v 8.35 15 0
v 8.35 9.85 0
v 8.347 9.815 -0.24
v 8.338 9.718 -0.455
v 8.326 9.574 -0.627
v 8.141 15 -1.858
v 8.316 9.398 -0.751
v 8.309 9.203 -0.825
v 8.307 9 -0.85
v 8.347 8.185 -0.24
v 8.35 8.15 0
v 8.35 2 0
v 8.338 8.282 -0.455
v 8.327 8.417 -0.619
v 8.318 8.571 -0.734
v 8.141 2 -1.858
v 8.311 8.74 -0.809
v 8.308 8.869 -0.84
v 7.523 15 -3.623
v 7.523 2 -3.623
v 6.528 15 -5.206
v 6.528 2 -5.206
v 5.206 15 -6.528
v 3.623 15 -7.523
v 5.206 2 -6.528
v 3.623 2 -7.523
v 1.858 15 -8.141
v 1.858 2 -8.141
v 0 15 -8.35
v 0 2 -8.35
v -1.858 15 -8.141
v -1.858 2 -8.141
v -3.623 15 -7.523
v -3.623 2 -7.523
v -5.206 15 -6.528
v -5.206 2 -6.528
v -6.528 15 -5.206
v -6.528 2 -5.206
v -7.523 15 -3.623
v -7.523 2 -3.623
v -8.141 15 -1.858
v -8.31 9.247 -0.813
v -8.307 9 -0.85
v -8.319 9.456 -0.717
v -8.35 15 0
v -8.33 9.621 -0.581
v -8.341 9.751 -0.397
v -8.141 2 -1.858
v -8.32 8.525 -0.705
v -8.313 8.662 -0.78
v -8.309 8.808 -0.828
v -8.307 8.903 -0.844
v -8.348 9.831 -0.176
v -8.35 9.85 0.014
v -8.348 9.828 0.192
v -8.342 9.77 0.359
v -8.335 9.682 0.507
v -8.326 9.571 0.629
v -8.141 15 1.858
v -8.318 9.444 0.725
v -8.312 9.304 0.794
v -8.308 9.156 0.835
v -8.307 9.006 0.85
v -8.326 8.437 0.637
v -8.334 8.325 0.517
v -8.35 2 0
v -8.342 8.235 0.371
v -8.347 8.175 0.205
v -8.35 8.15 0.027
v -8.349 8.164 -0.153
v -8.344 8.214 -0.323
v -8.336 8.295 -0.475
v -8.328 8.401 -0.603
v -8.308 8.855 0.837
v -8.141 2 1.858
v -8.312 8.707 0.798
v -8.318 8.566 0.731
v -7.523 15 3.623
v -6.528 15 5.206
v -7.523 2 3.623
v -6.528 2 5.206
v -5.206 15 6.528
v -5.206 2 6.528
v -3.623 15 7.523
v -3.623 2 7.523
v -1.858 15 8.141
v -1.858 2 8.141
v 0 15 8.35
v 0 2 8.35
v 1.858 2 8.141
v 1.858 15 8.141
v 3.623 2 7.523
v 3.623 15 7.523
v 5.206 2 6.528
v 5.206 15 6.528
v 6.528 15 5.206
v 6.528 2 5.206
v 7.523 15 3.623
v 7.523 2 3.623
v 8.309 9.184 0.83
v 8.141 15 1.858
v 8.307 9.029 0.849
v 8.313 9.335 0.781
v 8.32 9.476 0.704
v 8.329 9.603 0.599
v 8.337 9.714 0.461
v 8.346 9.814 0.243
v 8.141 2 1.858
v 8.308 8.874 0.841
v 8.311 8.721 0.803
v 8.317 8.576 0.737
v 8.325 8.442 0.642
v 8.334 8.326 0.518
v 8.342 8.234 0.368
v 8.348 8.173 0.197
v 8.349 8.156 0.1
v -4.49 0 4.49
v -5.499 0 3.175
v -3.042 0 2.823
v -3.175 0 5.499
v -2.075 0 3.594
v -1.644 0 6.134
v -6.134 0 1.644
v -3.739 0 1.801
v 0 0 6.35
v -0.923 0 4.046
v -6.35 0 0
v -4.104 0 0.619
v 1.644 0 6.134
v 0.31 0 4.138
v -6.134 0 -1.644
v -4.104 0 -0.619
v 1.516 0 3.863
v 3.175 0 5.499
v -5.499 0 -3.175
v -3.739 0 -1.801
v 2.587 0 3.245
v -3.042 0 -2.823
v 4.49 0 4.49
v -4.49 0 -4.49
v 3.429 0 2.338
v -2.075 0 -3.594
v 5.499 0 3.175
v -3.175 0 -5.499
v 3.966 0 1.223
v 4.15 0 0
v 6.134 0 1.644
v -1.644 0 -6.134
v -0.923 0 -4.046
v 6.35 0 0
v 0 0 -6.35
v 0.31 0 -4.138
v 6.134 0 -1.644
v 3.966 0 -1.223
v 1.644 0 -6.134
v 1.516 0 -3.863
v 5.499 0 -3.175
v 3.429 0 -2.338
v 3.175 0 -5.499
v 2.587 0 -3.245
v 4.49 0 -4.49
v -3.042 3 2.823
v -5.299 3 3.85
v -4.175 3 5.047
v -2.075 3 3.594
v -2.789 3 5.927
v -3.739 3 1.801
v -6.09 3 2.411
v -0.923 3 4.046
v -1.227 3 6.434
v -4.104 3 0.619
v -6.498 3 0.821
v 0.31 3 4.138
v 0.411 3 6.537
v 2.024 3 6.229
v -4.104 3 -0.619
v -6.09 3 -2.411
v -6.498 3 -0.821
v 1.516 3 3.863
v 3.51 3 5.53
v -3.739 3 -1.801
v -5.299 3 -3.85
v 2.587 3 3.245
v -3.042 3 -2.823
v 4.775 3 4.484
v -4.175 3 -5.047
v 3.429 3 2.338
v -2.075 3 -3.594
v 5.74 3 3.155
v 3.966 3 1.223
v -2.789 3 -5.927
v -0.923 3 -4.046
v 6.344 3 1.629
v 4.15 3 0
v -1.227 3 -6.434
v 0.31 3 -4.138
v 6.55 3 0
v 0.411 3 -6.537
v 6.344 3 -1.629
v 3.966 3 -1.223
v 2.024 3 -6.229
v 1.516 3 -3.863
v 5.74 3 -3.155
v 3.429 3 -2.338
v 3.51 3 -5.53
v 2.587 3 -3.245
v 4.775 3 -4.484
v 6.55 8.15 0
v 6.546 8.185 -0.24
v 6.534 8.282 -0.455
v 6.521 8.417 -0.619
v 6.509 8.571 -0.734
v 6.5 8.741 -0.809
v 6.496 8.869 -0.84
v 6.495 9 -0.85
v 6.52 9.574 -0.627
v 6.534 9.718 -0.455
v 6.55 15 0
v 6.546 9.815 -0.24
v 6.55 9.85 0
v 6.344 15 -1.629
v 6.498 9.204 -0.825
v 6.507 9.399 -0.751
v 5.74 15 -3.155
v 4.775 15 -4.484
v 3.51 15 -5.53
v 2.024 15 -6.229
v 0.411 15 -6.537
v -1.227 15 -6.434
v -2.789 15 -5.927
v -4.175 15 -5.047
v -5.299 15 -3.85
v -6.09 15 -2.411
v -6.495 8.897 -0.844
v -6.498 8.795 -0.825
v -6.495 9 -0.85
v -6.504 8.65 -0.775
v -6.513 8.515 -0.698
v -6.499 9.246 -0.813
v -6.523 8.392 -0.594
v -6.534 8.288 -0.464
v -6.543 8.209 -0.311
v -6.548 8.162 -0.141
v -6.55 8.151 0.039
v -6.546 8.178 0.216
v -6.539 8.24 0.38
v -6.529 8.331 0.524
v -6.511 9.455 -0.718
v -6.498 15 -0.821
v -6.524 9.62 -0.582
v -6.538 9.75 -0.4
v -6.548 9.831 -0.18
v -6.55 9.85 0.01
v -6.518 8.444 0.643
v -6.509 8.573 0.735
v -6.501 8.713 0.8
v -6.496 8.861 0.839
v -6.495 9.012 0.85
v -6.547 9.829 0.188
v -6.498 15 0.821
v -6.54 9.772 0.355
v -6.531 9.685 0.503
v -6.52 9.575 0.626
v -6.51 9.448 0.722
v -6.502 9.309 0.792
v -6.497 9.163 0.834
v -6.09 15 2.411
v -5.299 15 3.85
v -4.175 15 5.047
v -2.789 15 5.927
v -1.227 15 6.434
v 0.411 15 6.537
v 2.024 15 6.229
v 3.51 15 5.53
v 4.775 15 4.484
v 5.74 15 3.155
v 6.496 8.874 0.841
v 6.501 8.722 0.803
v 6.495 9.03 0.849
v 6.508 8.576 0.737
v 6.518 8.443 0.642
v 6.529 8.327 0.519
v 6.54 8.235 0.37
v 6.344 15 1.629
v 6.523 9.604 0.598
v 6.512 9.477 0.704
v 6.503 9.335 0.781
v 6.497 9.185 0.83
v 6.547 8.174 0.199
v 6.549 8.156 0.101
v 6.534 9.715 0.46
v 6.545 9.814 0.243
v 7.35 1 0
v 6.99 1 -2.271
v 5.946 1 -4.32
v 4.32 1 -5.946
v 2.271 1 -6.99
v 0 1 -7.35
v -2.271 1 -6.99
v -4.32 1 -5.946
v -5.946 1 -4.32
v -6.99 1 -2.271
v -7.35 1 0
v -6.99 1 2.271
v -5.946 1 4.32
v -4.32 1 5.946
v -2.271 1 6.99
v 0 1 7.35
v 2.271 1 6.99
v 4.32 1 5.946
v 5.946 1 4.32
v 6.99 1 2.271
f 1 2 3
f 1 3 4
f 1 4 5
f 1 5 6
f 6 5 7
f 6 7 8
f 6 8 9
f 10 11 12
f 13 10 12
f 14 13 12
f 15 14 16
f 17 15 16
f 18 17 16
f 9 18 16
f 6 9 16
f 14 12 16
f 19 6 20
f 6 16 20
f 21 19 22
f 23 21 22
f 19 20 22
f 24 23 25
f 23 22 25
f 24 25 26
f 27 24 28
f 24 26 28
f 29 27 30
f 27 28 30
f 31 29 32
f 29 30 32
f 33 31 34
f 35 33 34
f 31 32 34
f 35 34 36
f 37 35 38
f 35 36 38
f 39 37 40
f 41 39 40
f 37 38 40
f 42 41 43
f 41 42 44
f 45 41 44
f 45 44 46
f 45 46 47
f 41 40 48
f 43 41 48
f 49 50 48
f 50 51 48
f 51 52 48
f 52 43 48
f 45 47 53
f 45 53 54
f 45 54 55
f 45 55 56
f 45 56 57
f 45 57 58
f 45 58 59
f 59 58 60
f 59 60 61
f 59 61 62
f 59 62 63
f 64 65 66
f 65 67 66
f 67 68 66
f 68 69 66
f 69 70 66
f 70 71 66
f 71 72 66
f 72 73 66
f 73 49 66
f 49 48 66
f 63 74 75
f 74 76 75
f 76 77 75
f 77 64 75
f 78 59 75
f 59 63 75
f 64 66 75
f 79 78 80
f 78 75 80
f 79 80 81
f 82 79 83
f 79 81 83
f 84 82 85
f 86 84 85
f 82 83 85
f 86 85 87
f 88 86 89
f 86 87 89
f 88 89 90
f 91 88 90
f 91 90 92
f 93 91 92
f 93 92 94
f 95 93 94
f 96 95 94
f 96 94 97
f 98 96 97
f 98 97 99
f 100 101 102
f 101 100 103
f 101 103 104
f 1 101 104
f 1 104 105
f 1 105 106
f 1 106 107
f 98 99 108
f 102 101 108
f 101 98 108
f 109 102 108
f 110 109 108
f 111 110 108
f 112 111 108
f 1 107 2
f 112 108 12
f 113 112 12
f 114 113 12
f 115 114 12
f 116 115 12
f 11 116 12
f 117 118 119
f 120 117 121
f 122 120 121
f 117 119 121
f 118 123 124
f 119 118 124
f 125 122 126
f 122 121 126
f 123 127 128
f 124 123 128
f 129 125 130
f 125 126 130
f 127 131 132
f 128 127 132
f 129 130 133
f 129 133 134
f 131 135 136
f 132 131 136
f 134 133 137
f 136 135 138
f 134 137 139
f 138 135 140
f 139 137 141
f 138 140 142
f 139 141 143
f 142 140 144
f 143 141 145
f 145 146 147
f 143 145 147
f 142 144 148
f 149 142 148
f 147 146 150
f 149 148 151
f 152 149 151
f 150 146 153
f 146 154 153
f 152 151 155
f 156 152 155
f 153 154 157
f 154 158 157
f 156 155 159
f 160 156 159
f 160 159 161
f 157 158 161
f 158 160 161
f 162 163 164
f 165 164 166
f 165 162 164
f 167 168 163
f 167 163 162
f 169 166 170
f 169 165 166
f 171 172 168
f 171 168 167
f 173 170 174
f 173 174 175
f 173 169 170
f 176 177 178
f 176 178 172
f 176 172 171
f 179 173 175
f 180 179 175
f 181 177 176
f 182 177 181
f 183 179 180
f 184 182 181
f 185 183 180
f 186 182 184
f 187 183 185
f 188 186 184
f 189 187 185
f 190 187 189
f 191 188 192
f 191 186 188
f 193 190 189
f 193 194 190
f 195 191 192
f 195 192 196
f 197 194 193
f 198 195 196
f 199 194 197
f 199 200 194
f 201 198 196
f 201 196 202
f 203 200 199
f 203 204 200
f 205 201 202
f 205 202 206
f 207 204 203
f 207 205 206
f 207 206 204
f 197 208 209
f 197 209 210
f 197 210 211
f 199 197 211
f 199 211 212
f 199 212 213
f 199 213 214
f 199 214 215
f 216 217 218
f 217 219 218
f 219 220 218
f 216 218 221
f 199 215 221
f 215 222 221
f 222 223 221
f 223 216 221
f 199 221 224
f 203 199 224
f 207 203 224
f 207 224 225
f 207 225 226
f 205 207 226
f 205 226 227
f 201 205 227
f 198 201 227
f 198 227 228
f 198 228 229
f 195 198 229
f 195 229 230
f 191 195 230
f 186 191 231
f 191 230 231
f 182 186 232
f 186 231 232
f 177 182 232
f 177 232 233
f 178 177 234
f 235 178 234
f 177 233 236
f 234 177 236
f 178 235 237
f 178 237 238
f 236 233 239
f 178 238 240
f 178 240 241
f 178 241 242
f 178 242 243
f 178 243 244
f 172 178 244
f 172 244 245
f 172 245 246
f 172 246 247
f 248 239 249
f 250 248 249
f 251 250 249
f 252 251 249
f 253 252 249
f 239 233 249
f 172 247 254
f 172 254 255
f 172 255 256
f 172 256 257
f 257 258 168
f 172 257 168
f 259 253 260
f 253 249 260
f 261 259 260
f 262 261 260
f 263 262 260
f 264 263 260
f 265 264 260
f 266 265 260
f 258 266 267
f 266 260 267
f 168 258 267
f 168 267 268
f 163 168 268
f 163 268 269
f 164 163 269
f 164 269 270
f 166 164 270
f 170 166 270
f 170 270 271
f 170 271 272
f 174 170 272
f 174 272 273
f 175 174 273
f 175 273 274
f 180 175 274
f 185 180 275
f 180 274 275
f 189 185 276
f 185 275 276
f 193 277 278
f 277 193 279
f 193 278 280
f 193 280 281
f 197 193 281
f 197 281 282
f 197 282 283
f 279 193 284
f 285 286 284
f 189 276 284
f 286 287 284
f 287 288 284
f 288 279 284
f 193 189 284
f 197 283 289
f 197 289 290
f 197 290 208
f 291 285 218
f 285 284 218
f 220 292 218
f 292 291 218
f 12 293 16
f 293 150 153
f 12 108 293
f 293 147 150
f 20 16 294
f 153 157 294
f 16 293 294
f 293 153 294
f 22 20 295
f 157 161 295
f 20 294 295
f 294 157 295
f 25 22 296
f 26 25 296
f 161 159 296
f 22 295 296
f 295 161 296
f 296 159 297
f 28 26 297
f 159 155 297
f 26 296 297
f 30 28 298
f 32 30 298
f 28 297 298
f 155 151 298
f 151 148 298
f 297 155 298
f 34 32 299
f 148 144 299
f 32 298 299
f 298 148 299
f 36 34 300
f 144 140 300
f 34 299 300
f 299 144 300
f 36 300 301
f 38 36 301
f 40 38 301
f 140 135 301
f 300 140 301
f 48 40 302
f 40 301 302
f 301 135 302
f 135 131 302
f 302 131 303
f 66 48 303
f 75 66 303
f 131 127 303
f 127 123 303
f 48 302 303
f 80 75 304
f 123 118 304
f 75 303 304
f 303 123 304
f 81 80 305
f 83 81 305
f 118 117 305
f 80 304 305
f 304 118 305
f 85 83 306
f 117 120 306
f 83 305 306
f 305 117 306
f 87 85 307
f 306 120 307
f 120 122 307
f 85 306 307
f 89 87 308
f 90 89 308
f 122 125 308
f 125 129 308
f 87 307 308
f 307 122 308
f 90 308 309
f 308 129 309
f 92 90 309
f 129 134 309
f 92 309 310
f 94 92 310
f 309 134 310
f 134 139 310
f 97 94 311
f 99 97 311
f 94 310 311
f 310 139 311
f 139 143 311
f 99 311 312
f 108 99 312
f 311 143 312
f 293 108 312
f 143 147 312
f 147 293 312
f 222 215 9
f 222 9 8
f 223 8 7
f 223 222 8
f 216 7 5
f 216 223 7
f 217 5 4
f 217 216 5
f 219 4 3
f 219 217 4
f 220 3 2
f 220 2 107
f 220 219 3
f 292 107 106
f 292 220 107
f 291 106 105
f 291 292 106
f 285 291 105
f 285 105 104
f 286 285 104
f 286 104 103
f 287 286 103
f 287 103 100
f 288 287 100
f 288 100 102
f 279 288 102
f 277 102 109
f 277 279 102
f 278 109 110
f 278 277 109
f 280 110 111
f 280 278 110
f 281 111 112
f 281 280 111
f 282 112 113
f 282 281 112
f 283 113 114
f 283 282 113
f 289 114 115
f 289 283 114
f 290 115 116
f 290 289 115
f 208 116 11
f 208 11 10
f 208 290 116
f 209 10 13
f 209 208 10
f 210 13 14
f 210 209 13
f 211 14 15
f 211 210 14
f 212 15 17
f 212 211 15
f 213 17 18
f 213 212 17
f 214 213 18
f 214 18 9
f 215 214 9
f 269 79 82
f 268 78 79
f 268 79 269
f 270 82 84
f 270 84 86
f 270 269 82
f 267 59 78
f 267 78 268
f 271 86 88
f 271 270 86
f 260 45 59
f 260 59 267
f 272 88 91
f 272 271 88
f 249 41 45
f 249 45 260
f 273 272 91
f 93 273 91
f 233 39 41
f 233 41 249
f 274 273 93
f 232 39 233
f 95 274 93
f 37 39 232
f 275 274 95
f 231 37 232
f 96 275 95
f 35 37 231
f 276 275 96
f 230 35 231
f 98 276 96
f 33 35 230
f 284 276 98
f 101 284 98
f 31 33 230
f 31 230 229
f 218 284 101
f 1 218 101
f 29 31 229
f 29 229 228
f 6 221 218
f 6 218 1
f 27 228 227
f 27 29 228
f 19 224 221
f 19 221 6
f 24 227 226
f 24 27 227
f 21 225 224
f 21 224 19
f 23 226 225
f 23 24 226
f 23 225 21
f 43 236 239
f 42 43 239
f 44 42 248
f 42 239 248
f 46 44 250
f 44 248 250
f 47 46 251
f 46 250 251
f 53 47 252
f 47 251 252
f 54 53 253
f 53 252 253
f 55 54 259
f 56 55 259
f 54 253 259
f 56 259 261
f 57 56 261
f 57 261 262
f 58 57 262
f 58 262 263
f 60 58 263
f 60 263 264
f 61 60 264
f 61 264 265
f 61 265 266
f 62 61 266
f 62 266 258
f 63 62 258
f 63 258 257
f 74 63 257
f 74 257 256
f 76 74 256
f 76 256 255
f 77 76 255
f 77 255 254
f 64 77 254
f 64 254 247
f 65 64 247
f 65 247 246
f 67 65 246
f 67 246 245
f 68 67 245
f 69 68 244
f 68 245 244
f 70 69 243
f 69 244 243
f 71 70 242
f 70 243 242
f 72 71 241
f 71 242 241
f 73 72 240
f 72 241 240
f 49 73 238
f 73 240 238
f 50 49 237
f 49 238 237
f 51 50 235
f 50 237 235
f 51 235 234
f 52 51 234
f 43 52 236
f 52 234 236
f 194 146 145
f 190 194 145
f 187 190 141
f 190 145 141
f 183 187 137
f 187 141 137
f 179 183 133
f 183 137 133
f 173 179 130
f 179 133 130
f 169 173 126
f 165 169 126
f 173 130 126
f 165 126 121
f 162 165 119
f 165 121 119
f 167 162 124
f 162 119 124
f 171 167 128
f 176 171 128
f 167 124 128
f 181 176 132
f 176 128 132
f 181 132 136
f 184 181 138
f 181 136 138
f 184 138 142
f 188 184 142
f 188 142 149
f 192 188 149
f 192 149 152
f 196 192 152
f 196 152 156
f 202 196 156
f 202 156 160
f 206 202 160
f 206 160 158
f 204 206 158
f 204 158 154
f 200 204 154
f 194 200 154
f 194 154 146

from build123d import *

# Parameters (mm, degrees)
SKETCH1_R               = 8.35
BOSS_EXTRUDE1_DEPTH     = 15
SKETCH2_R               = 6.55
CUT_EXTRUDE1_DEPTH      = 12
SKETCH3_R               = 0.85
CUT_EXTRUDE2_DEPTH      = 9.35
CUT_EXTRUDE2_DEPTH_BACK = 9.35
SKETCH4_R               = 4.15
CUT_EXTRUDE3_DEPTH      = 16.0000001
CHAMFER1_SIZE           = 2


with BuildPart() as part:
    # Sketch1 → Boss-Extrude1 (new body)
    with BuildSketch(Plane(origin=(0, 0, 0), x_dir=(1, 0, 0), z_dir=(0, 1, 0))):
        Circle(SKETCH1_R)
    extrude(amount=BOSS_EXTRUDE1_DEPTH)

    # Sketch2 → Cut-Extrude1 (cut)
    with BuildSketch(Plane(origin=(0, 15, 0), x_dir=(1, 0, 0), z_dir=(0, 1, 0))):
        Circle(SKETCH2_R)
    extrude(amount=-CUT_EXTRUDE1_DEPTH, mode=Mode.SUBTRACT)

    # Sketch3 → Cut-Extrude2 (cut, two sides)
    with BuildSketch(Plane(origin=(0, 0, 0), x_dir=(0, 0, -1), z_dir=(1, 0, 0))) as cut_extrude2_sk:
        with Locations((0, 9)):
            Circle(SKETCH3_R)
    extrude(amount=CUT_EXTRUDE2_DEPTH, mode=Mode.SUBTRACT)
    extrude(cut_extrude2_sk.sketch, amount=-CUT_EXTRUDE2_DEPTH_BACK, mode=Mode.SUBTRACT)

    # Sketch4 → Cut-Extrude3 (cut, through all)
    with BuildSketch(Plane.XZ):
        Circle(SKETCH4_R)
    extrude(amount=-CUT_EXTRUDE3_DEPTH, mode=Mode.SUBTRACT)

    # Chamfer1
    chamfer1_edges = [part.edges().sort_by_distance(p)[0] for p in [
        (-8.35, 0, 0),
    ]]
    chamfer(chamfer1_edges, length=CHAMFER1_SIZE)


solid = part.part
